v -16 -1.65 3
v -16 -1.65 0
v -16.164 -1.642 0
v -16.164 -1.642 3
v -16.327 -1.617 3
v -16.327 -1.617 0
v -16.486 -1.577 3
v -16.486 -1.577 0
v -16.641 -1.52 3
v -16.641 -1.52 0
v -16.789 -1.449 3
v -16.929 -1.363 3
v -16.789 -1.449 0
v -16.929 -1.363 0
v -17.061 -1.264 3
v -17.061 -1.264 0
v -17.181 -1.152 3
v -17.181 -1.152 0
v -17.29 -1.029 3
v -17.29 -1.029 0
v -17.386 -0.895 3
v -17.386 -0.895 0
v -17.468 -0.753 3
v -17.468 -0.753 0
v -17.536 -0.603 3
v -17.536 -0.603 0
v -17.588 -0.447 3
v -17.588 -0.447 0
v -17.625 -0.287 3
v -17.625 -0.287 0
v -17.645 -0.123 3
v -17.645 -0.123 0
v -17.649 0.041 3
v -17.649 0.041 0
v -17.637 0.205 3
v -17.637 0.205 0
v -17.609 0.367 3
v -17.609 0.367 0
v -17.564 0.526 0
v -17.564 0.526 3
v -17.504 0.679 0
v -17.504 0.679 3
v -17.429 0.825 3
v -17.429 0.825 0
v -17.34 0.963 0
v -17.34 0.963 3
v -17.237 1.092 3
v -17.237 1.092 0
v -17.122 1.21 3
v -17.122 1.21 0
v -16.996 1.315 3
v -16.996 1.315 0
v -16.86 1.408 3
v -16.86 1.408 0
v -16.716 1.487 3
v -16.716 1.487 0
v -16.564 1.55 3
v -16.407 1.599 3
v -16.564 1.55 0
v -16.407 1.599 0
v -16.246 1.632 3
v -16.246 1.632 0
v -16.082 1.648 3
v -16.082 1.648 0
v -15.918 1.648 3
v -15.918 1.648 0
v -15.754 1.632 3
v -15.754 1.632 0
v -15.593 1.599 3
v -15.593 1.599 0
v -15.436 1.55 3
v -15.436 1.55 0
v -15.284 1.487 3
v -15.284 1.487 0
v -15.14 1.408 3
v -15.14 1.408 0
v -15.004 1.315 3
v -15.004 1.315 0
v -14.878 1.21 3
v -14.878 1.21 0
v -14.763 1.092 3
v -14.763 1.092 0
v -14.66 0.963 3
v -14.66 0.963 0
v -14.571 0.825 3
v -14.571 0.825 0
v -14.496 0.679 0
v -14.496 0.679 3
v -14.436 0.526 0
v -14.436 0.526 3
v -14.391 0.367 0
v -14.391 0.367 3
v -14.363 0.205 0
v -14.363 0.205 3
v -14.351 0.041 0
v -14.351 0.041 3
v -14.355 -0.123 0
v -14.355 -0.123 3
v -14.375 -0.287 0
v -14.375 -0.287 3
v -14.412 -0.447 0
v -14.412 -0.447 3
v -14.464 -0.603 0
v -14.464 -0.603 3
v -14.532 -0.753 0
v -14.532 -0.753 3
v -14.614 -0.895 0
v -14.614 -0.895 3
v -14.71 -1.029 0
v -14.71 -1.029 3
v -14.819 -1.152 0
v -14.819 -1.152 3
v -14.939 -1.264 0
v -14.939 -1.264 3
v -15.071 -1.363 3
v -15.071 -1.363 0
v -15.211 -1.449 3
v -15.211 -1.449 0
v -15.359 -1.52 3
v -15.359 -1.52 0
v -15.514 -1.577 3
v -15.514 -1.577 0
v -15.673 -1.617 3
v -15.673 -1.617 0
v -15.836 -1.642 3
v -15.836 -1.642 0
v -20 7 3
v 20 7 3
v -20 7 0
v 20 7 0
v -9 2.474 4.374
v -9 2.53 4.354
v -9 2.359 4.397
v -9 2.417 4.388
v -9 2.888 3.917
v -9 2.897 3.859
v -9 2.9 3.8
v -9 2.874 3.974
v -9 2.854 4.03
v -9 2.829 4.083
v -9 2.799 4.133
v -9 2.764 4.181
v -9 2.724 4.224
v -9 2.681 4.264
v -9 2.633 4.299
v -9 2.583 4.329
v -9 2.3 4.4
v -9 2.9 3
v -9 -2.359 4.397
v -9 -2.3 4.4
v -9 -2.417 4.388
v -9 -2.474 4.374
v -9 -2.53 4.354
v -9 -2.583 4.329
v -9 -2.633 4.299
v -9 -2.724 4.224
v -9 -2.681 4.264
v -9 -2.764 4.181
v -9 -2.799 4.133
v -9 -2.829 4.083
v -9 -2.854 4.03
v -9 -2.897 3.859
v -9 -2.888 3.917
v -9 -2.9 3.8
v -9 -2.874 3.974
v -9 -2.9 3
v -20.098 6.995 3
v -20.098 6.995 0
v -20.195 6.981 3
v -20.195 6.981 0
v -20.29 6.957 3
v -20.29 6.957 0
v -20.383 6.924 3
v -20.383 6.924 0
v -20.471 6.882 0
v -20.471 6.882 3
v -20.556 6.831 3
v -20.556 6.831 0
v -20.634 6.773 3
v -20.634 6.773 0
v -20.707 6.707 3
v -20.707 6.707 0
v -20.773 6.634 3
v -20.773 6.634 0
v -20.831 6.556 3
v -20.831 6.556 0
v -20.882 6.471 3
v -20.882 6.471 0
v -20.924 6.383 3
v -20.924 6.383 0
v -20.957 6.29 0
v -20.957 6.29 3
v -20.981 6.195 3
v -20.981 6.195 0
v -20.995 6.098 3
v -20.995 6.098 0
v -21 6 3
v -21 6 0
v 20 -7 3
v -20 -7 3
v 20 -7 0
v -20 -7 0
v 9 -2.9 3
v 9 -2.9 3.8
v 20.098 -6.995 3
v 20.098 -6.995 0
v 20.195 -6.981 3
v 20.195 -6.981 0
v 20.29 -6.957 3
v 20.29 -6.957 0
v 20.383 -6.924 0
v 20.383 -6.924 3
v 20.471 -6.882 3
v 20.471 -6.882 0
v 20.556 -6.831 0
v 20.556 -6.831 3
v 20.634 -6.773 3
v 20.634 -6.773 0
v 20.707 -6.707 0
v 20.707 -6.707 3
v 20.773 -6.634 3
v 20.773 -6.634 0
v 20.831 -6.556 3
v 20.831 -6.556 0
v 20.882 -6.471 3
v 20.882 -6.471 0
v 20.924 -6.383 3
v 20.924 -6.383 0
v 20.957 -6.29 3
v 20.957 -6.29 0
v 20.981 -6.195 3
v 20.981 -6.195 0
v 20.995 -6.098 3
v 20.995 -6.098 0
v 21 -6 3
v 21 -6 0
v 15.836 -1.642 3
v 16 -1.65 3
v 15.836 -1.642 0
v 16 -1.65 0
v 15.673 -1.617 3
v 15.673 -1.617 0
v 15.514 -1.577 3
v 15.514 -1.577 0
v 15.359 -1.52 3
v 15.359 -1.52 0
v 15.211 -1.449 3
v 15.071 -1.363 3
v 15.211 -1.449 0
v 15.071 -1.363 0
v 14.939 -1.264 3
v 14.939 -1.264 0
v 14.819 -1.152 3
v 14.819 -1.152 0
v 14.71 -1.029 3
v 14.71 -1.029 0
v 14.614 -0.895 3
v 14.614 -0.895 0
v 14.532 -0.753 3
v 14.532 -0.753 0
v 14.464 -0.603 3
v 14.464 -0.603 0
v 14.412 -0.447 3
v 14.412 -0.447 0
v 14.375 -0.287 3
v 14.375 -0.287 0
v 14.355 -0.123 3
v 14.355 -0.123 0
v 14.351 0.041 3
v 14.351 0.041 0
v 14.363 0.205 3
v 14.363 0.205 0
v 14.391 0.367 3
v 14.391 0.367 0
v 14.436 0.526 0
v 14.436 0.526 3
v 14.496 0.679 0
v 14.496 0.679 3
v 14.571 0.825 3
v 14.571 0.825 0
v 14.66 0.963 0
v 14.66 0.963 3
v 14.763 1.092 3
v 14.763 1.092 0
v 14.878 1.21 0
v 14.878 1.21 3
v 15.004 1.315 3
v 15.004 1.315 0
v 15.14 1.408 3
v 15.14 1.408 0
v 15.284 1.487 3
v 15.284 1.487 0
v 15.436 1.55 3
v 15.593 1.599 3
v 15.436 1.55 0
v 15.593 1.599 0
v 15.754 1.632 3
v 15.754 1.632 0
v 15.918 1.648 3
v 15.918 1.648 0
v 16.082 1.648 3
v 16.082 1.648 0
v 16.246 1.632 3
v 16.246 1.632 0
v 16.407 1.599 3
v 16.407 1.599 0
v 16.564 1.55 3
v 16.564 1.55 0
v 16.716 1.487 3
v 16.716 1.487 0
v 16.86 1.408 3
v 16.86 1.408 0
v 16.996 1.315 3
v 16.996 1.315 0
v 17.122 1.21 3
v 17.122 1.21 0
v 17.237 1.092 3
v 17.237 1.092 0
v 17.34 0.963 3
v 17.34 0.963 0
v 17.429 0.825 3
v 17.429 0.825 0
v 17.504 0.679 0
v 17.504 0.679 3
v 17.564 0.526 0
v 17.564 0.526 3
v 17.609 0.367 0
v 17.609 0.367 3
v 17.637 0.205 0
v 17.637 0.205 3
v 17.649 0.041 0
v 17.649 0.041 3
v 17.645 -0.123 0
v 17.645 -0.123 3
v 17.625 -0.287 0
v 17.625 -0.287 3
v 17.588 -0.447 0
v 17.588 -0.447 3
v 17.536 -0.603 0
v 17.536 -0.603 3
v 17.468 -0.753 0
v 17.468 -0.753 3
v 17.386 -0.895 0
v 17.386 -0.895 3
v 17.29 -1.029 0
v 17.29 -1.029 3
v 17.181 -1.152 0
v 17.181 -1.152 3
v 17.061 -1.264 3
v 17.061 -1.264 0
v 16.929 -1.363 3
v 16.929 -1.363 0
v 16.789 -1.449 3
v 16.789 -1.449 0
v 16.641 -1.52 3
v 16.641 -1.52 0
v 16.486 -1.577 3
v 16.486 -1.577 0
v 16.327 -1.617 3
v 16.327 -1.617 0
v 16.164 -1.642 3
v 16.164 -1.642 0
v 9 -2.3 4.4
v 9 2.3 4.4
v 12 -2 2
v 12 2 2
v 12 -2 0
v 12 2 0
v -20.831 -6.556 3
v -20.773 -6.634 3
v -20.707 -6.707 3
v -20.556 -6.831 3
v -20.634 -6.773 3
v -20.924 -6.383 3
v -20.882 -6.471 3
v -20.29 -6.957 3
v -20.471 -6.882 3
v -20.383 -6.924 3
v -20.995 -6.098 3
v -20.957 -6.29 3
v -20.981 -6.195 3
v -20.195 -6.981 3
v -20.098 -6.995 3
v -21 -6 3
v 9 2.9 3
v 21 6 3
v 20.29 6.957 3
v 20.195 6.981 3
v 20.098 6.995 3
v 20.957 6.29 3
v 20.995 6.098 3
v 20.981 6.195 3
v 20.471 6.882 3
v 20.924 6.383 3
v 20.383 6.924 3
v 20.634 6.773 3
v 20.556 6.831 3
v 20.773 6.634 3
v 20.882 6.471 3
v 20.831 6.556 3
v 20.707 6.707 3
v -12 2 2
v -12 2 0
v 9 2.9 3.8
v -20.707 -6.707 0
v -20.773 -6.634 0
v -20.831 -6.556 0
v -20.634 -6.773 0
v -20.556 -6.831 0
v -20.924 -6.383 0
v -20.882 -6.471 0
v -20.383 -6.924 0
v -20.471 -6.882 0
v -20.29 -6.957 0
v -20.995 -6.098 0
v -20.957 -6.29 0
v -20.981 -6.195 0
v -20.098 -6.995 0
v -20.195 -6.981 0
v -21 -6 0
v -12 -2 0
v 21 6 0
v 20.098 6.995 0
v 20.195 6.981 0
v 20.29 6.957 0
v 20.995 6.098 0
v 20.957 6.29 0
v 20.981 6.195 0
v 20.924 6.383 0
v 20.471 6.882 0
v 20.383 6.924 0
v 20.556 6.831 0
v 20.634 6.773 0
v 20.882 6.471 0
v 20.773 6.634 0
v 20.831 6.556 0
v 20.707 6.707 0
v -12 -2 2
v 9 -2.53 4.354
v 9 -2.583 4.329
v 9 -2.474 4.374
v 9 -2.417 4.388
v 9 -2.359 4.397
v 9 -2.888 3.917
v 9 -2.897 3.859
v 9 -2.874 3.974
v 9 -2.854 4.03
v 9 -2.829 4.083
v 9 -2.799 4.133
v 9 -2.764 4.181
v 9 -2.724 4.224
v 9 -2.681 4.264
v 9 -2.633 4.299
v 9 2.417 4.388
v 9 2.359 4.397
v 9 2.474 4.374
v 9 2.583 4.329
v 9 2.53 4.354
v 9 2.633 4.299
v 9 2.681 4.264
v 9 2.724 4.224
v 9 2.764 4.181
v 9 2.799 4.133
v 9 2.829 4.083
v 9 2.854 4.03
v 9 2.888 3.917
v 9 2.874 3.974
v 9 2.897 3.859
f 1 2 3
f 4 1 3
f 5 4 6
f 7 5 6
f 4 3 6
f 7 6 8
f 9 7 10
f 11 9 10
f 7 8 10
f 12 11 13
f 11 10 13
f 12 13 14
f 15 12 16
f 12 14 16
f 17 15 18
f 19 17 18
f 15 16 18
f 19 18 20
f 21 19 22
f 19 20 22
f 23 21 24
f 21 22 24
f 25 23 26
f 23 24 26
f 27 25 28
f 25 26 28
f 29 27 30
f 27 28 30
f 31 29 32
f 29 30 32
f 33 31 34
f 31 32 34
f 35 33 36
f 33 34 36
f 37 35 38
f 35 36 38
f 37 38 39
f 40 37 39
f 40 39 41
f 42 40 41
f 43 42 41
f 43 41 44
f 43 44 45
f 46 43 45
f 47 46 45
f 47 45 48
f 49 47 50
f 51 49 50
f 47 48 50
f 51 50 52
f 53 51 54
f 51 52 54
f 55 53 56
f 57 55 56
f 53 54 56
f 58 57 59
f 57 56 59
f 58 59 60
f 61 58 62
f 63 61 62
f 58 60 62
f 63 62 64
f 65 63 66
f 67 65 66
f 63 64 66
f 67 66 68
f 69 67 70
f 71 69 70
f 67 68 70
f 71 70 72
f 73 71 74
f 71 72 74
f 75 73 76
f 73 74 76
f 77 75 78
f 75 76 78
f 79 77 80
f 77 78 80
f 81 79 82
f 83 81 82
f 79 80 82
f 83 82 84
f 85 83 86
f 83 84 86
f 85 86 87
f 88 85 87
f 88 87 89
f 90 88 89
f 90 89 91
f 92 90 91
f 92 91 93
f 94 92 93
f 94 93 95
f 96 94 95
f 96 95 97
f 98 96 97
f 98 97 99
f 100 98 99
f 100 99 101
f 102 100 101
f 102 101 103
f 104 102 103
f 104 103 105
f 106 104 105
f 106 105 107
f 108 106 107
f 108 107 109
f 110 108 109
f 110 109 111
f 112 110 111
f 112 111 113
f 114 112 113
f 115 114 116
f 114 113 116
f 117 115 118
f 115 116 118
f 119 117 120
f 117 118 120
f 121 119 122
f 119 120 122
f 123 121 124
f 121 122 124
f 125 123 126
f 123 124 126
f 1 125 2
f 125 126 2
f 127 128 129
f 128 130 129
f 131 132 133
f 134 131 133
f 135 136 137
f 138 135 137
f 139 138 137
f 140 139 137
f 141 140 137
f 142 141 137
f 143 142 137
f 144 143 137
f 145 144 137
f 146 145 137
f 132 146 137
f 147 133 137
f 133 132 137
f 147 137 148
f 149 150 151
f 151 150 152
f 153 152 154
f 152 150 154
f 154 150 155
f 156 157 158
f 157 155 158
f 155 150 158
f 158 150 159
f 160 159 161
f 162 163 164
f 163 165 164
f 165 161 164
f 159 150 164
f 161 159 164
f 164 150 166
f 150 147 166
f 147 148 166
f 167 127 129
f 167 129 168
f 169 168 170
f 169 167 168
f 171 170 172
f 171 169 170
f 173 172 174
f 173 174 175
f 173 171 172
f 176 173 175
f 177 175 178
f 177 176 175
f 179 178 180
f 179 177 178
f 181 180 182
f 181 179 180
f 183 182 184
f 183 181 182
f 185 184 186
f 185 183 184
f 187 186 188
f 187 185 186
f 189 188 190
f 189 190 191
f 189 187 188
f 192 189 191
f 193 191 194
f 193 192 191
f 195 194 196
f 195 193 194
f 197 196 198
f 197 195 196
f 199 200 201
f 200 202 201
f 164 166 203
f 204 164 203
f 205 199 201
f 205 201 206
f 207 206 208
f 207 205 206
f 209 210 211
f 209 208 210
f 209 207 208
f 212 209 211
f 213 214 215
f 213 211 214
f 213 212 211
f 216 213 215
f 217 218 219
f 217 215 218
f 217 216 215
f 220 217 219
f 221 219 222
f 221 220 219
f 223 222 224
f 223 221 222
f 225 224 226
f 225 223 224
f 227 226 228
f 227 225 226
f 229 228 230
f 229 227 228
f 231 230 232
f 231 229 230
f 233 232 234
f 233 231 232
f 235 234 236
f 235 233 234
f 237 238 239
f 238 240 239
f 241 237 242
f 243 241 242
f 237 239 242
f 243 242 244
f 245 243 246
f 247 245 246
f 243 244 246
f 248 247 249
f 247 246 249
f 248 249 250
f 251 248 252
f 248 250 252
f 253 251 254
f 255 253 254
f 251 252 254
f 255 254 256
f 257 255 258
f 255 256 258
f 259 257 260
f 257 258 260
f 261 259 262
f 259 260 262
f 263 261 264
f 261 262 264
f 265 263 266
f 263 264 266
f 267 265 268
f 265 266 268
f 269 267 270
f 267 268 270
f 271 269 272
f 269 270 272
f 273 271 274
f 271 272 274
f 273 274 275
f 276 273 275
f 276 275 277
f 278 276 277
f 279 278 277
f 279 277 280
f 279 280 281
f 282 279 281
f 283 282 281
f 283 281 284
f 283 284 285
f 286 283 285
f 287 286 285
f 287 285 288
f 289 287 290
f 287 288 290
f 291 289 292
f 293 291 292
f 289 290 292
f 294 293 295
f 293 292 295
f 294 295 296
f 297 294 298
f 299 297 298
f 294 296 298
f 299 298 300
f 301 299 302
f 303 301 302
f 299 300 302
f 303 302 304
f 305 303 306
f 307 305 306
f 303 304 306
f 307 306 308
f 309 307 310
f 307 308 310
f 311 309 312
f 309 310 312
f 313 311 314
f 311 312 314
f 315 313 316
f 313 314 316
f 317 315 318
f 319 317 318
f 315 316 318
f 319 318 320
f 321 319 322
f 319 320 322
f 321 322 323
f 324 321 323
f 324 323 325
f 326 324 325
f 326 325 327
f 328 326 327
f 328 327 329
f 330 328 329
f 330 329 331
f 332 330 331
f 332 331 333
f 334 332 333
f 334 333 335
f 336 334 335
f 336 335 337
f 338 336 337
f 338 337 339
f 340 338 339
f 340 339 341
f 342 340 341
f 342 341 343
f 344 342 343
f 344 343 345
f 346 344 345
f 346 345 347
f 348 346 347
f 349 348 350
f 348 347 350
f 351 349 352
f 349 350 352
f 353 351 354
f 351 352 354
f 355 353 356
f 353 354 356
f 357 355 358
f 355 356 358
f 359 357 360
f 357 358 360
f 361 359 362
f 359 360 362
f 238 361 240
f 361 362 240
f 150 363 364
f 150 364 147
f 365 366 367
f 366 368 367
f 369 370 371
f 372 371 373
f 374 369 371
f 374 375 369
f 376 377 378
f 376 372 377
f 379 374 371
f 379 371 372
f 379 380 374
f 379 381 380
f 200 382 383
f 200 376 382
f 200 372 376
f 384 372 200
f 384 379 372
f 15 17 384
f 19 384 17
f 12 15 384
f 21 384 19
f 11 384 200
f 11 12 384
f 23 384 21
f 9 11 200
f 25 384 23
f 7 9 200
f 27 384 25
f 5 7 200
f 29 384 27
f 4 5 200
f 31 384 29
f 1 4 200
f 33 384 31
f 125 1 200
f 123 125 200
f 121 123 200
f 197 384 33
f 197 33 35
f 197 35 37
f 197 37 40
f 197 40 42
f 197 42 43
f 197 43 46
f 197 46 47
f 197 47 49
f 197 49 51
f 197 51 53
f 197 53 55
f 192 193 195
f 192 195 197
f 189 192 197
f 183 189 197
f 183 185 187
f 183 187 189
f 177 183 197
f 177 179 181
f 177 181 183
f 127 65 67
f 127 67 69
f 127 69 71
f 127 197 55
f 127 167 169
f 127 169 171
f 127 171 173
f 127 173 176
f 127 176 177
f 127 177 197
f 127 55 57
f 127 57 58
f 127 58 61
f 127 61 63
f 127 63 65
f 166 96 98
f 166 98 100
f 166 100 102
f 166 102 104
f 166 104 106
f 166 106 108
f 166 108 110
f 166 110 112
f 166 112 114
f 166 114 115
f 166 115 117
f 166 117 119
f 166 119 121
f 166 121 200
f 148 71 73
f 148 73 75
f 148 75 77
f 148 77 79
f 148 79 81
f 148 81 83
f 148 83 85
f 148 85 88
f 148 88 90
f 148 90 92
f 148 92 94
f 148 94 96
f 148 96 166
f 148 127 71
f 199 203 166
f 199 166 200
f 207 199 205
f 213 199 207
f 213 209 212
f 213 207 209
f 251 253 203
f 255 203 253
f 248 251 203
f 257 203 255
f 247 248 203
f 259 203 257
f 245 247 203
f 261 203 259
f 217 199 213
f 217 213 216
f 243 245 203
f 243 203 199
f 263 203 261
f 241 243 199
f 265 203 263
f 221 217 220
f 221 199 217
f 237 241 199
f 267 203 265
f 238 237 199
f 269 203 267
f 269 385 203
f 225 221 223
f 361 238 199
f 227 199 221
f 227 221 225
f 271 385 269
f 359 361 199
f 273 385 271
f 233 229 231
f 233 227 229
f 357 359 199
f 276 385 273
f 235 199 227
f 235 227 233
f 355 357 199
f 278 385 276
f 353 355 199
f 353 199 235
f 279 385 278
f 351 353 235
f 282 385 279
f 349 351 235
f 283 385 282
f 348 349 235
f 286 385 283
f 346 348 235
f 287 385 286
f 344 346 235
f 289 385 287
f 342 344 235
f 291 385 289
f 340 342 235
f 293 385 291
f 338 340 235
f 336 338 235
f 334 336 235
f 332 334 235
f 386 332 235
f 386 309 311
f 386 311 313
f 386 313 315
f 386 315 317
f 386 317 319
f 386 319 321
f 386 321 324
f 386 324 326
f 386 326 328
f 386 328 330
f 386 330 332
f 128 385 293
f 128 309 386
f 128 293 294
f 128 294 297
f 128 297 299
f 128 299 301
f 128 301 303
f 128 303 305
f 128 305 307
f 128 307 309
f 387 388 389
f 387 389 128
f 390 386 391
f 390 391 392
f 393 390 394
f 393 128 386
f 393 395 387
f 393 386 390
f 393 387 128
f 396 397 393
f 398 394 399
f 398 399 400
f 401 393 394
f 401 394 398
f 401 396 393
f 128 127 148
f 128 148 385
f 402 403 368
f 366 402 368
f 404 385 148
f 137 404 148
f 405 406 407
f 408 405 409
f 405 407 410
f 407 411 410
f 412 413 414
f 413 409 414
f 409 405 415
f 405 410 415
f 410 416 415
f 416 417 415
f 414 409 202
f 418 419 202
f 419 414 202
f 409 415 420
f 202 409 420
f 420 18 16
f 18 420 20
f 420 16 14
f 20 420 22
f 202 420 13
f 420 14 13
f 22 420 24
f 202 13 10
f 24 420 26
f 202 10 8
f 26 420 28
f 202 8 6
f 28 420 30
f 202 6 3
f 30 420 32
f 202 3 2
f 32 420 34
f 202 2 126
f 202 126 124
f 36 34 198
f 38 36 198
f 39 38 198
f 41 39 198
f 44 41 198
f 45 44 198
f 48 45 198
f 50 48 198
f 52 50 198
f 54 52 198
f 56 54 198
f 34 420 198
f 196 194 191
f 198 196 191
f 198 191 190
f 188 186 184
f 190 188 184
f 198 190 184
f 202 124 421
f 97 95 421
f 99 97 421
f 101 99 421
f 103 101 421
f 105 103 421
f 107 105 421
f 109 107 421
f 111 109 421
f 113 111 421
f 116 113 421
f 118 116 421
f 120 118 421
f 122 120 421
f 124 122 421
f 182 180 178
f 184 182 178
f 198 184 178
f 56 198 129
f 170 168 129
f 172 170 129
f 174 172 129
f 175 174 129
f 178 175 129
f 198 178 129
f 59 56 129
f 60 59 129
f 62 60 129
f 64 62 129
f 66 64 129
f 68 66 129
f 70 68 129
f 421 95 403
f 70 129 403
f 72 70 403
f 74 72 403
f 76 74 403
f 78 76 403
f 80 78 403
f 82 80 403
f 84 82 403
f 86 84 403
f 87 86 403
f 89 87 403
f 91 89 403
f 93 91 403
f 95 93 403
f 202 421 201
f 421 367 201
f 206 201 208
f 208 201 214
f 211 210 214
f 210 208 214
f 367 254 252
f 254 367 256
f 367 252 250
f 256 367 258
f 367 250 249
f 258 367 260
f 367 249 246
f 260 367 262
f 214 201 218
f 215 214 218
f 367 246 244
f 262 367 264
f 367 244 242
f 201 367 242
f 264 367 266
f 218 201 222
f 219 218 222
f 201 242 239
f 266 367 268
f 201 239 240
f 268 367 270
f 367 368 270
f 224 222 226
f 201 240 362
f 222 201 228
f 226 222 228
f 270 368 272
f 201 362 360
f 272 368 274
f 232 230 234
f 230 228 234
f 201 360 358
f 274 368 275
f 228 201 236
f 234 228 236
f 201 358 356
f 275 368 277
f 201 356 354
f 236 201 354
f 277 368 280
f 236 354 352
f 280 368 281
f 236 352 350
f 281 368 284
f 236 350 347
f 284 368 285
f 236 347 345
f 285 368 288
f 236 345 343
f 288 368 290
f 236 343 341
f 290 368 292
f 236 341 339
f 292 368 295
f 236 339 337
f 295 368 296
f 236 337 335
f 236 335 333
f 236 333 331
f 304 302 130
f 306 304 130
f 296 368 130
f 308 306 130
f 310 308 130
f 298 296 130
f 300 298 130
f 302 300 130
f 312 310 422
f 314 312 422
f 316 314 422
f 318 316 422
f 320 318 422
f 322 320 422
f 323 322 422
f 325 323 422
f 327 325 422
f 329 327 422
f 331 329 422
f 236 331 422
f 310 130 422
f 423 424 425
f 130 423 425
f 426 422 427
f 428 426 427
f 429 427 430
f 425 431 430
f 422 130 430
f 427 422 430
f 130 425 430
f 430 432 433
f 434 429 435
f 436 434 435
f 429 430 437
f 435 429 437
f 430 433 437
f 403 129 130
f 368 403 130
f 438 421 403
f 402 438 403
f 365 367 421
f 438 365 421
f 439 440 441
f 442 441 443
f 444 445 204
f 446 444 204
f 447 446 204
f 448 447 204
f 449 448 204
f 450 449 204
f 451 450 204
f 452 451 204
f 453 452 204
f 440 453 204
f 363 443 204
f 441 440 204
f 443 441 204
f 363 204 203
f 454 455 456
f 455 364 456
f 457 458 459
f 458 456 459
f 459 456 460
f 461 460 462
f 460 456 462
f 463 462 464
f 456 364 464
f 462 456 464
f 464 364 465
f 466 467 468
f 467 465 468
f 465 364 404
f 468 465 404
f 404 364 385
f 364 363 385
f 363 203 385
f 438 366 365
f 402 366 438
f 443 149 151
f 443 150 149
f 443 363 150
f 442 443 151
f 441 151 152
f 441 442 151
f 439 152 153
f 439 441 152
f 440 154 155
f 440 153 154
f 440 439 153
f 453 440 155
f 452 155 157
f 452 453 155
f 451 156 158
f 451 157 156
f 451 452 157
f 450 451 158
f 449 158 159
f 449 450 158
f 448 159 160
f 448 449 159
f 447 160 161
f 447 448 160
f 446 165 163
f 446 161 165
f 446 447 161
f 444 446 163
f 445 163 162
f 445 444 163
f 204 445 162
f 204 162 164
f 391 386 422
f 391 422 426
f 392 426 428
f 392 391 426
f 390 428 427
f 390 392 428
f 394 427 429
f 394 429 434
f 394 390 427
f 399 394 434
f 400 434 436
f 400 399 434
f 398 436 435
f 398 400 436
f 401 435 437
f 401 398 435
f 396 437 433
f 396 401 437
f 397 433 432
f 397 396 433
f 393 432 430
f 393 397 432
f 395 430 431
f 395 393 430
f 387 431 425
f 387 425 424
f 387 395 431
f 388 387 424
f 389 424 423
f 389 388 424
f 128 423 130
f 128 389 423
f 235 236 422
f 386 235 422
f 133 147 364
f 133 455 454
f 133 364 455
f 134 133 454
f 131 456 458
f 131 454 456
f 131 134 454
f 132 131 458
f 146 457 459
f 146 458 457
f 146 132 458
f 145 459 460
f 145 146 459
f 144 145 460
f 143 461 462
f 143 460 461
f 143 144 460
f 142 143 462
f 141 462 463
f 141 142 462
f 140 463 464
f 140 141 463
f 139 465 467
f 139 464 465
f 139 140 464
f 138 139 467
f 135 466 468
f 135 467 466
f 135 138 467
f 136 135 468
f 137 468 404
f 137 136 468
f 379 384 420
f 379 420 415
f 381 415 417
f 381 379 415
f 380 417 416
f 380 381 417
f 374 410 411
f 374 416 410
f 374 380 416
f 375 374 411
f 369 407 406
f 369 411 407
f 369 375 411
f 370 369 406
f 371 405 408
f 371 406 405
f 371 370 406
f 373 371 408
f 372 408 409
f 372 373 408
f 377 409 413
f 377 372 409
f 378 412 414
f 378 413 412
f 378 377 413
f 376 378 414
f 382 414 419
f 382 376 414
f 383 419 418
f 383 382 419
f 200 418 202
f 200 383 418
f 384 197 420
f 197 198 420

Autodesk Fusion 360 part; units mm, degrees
sketch "Sketch1" plane through (0, 0, 0) normal (0, 0, 1) x (1, 0, 0)
  line L0 (21, 7) -> (-21, 7)
  line L1 (-21, 7) -> (-21, -7)
  line L2 (-21, -7) -> (21, -7)
  line L3 (21, -7) -> (21, 7)
  line L4 (21, 7) -> (-21, -7) construction
  line L5 (-21, 7) -> (21, -7) construction
  line L6 (-16, 0) -> (16, 0) construction
  circle A0 centre (-16, 0) radius 2.35
  circle A1 centre (16, 0) radius 2.35
  dimension "d1" = 14
  dimension "d2" = 42
  dimension "d3" = 32
  dimension "d4" = 4.7
extrude "Extrude1" add sketch "Sketch1" along normal blind 3 contours L0 L1 L2 L3 | A0 | A1
sketch "Sketch2" plane through (0, 0, 3) normal (0, 0, 1) x (-1, 0, 0)
  line L0 (-21, 7) -> (-21, -7)
  line L1 (-21, -7) -> (21, -7)
  line L2 (21, -7) -> (21, 7)
  line L3 (21, 7) -> (-21, 7)
  line L4 (16, 0) -> (-16, 0) construction
  dimension "d7" = 32
hole "Hole1" at (-16, 0, 3) at (16, 0, 3) direction (0, 0, -1) diameter 3.3 depth 5 tip angle 180
sketch "Sketch3" plane through (0, 0, 0) normal (0, 0, -1) x (-1, 0, 0)
  circle A0 centre (16, 0) radius 1.65
  circle A1 centre (-16, 0) radius 1.65
  line L0 (-21, 6) -> (-21, -6)
  line L1 (-21, -6) -> (21, -6)
  line L2 (21, -6) -> (21, 6)
  line L3 (21, 6) -> (-21, 6)
  circle A2 centre (16, 0) radius 1.65
  circle A3 centre (-16, 0) radius 1.65
  line L4 (-21, 7) -> (-21, -7)
  line L5 (-21, -7) -> (21, -7)
  line L6 (21, -7) -> (21, 7)
  line L7 (21, 7) -> (-21, 7)
  line L8 (-12, -2) -> (12, -2)
  line L9 (12, -2) -> (12, 2)
  line L10 (12, 2) -> (-12, 2)
  line L11 (-12, 2) -> (-12, -2)
  line L12 (-12, -2) -> (12, 2) construction
  line L13 (12, -2) -> (-12, 2) construction
  dimension "d11" = 4
  dimension "d12" = 24
extrude "Extrude2" cut sketch "Sketch3" against normal blind 2 contours L8 L9 L10 L11
sketch "Sketch4" plane through (0, 0, 3) normal (0, 0, 1) x (-1, 0, 0)
  circle A0 centre (16, 0) radius 1.65
  circle A1 centre (-16, 0) radius 1.65
  line L0 (-21, 7) -> (-21, -7)
  line L1 (-21, -7) -> (21, -7)
  line L2 (21, -7) -> (21, 7)
  line L3 (21, 7) -> (-21, 7)
  line L4 (-9, -2.9) -> (9, -2.9)
  line L5 (9, -2.9) -> (9, 2.9)
  line L6 (9, 2.9) -> (-9, 2.9)
  line L7 (-9, 2.9) -> (-9, -2.9)
  line L8 (-9, -2.9) -> (9, 2.9) construction
  line L9 (9, -2.9) -> (-9, 2.9) construction
  dimension "d15" = 5.8
  dimension "d16" = 18
extrude "Extrude3" add sketch "Sketch4" along normal blind 1.4 contours L4 L5 L6 L7
fillet "Fillet1" radius 0.6 2 edges at (0, -2.9, 4.4) (0, 2.9, 4.4)
fillet "Fillet2" radius 1 4 edges at (-21, 7, 1.5) (21, 7, 1.5) (21, -7, 1.5) (-21, -7, 1.5)
